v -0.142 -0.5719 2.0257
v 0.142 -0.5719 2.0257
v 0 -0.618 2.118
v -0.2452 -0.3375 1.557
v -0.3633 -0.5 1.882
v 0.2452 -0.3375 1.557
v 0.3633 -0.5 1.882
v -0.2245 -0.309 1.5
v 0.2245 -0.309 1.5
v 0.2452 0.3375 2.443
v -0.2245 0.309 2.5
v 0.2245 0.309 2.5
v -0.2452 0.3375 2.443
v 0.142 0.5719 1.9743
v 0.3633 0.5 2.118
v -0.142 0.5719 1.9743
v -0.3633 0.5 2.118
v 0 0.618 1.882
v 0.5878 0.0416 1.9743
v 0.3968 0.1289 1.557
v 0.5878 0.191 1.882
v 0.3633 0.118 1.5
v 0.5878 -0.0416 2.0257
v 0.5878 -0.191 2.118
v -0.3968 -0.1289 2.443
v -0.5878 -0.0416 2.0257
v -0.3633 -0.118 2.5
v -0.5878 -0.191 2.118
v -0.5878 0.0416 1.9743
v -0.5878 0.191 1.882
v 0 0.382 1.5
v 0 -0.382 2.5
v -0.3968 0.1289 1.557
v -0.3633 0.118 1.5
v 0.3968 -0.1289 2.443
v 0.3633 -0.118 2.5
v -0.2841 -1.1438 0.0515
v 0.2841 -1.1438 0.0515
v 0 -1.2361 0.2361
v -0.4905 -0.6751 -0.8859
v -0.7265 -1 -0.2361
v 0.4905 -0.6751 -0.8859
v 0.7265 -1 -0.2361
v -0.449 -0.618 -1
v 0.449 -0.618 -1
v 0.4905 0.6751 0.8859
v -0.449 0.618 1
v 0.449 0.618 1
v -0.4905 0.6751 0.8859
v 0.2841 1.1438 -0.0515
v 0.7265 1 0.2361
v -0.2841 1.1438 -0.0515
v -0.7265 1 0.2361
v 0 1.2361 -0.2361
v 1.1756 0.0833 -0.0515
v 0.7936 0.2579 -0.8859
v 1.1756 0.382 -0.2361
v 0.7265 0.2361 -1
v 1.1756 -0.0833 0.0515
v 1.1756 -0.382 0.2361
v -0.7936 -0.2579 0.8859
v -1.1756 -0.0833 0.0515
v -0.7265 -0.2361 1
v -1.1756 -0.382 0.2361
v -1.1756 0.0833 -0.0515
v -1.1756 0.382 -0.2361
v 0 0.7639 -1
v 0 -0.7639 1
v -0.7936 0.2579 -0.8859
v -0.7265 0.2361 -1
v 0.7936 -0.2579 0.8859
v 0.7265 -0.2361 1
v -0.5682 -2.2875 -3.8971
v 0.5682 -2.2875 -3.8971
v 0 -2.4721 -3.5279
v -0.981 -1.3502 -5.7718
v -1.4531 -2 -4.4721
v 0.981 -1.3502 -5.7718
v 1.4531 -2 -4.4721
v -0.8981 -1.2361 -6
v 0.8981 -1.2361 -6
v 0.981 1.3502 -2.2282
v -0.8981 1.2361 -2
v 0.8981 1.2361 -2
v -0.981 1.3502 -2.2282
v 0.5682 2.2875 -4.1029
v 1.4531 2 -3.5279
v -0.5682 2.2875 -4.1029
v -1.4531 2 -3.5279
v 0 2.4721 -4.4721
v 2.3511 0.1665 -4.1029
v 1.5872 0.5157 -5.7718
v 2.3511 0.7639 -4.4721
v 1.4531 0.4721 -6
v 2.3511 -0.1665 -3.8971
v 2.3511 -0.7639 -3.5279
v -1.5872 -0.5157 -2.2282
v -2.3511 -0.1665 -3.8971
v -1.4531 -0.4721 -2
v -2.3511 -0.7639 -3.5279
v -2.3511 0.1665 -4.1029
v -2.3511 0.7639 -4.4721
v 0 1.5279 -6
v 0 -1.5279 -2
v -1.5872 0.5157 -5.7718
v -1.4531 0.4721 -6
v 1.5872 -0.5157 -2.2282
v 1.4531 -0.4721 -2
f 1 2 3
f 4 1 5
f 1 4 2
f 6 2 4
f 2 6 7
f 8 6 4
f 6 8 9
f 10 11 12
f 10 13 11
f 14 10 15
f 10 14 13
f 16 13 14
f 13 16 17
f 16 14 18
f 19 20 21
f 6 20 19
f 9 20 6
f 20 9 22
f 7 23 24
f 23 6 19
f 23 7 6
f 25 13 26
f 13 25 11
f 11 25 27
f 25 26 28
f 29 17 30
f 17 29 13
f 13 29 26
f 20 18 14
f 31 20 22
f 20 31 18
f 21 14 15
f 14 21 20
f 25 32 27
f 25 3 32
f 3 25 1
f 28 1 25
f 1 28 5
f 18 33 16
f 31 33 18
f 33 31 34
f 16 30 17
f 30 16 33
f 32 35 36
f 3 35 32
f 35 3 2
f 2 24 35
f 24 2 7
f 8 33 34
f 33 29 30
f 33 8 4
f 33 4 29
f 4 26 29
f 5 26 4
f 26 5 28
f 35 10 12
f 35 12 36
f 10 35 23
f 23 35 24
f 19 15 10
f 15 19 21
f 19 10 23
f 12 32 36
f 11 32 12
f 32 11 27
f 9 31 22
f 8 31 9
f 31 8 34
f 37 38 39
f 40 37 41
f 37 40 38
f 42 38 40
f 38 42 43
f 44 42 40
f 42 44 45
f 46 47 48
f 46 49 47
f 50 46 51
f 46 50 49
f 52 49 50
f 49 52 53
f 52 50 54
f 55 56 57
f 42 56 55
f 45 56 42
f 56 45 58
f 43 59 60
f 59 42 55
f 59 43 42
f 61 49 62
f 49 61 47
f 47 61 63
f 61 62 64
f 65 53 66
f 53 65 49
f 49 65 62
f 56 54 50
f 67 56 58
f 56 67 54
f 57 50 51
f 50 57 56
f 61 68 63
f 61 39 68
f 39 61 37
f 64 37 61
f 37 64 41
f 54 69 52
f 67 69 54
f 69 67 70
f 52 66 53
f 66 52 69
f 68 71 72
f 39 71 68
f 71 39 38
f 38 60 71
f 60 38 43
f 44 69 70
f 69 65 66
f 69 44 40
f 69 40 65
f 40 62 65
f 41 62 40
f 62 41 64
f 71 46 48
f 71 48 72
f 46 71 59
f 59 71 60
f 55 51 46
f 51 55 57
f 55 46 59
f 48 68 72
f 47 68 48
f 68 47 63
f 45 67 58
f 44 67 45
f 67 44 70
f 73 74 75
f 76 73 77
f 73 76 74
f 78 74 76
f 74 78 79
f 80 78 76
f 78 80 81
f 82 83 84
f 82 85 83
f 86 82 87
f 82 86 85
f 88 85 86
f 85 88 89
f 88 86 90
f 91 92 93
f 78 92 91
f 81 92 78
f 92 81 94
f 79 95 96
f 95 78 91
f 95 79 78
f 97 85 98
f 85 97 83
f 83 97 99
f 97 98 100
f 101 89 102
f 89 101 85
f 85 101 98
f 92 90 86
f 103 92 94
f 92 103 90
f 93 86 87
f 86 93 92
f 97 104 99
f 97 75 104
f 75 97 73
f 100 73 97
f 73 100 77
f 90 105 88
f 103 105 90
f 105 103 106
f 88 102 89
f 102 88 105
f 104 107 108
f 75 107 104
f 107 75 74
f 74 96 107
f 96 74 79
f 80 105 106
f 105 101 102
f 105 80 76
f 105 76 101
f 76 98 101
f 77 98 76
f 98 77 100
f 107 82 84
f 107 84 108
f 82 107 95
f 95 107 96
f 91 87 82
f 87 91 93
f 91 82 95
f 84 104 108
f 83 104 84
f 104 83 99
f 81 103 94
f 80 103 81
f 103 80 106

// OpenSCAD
//create a dodecahedron by intersecting 6 boxes
module dodecahedron(height) 
{
        scale([height,height,height]) //scale by height parameter
        {
                intersection(){
                        //make a cube
                        cube([2,2,1], center = true); 
                        intersection_for(i=[0:4]) //loop i from 0 to 4, and intersect results
                        { 
                                //make a cube, rotate it 116.565 degrees around the X axis,
                                //then 72*i around the Z axis
                                rotate([0,0,72*i])
                                        rotate([116.565,0,0])
                                        cube([2,2,1], center = true); 
                        }
                }
        }
}
//create 3 stacked dodecahedra 
//call the module with a height of 1 and move up 2
translate([0,0,2])dodecahedron(1); 
//call the module with a height of 2
dodecahedron(2); 
//call the module with a height of 4 and move down 4
translate([0,0,-4])dodecahedron(4);
